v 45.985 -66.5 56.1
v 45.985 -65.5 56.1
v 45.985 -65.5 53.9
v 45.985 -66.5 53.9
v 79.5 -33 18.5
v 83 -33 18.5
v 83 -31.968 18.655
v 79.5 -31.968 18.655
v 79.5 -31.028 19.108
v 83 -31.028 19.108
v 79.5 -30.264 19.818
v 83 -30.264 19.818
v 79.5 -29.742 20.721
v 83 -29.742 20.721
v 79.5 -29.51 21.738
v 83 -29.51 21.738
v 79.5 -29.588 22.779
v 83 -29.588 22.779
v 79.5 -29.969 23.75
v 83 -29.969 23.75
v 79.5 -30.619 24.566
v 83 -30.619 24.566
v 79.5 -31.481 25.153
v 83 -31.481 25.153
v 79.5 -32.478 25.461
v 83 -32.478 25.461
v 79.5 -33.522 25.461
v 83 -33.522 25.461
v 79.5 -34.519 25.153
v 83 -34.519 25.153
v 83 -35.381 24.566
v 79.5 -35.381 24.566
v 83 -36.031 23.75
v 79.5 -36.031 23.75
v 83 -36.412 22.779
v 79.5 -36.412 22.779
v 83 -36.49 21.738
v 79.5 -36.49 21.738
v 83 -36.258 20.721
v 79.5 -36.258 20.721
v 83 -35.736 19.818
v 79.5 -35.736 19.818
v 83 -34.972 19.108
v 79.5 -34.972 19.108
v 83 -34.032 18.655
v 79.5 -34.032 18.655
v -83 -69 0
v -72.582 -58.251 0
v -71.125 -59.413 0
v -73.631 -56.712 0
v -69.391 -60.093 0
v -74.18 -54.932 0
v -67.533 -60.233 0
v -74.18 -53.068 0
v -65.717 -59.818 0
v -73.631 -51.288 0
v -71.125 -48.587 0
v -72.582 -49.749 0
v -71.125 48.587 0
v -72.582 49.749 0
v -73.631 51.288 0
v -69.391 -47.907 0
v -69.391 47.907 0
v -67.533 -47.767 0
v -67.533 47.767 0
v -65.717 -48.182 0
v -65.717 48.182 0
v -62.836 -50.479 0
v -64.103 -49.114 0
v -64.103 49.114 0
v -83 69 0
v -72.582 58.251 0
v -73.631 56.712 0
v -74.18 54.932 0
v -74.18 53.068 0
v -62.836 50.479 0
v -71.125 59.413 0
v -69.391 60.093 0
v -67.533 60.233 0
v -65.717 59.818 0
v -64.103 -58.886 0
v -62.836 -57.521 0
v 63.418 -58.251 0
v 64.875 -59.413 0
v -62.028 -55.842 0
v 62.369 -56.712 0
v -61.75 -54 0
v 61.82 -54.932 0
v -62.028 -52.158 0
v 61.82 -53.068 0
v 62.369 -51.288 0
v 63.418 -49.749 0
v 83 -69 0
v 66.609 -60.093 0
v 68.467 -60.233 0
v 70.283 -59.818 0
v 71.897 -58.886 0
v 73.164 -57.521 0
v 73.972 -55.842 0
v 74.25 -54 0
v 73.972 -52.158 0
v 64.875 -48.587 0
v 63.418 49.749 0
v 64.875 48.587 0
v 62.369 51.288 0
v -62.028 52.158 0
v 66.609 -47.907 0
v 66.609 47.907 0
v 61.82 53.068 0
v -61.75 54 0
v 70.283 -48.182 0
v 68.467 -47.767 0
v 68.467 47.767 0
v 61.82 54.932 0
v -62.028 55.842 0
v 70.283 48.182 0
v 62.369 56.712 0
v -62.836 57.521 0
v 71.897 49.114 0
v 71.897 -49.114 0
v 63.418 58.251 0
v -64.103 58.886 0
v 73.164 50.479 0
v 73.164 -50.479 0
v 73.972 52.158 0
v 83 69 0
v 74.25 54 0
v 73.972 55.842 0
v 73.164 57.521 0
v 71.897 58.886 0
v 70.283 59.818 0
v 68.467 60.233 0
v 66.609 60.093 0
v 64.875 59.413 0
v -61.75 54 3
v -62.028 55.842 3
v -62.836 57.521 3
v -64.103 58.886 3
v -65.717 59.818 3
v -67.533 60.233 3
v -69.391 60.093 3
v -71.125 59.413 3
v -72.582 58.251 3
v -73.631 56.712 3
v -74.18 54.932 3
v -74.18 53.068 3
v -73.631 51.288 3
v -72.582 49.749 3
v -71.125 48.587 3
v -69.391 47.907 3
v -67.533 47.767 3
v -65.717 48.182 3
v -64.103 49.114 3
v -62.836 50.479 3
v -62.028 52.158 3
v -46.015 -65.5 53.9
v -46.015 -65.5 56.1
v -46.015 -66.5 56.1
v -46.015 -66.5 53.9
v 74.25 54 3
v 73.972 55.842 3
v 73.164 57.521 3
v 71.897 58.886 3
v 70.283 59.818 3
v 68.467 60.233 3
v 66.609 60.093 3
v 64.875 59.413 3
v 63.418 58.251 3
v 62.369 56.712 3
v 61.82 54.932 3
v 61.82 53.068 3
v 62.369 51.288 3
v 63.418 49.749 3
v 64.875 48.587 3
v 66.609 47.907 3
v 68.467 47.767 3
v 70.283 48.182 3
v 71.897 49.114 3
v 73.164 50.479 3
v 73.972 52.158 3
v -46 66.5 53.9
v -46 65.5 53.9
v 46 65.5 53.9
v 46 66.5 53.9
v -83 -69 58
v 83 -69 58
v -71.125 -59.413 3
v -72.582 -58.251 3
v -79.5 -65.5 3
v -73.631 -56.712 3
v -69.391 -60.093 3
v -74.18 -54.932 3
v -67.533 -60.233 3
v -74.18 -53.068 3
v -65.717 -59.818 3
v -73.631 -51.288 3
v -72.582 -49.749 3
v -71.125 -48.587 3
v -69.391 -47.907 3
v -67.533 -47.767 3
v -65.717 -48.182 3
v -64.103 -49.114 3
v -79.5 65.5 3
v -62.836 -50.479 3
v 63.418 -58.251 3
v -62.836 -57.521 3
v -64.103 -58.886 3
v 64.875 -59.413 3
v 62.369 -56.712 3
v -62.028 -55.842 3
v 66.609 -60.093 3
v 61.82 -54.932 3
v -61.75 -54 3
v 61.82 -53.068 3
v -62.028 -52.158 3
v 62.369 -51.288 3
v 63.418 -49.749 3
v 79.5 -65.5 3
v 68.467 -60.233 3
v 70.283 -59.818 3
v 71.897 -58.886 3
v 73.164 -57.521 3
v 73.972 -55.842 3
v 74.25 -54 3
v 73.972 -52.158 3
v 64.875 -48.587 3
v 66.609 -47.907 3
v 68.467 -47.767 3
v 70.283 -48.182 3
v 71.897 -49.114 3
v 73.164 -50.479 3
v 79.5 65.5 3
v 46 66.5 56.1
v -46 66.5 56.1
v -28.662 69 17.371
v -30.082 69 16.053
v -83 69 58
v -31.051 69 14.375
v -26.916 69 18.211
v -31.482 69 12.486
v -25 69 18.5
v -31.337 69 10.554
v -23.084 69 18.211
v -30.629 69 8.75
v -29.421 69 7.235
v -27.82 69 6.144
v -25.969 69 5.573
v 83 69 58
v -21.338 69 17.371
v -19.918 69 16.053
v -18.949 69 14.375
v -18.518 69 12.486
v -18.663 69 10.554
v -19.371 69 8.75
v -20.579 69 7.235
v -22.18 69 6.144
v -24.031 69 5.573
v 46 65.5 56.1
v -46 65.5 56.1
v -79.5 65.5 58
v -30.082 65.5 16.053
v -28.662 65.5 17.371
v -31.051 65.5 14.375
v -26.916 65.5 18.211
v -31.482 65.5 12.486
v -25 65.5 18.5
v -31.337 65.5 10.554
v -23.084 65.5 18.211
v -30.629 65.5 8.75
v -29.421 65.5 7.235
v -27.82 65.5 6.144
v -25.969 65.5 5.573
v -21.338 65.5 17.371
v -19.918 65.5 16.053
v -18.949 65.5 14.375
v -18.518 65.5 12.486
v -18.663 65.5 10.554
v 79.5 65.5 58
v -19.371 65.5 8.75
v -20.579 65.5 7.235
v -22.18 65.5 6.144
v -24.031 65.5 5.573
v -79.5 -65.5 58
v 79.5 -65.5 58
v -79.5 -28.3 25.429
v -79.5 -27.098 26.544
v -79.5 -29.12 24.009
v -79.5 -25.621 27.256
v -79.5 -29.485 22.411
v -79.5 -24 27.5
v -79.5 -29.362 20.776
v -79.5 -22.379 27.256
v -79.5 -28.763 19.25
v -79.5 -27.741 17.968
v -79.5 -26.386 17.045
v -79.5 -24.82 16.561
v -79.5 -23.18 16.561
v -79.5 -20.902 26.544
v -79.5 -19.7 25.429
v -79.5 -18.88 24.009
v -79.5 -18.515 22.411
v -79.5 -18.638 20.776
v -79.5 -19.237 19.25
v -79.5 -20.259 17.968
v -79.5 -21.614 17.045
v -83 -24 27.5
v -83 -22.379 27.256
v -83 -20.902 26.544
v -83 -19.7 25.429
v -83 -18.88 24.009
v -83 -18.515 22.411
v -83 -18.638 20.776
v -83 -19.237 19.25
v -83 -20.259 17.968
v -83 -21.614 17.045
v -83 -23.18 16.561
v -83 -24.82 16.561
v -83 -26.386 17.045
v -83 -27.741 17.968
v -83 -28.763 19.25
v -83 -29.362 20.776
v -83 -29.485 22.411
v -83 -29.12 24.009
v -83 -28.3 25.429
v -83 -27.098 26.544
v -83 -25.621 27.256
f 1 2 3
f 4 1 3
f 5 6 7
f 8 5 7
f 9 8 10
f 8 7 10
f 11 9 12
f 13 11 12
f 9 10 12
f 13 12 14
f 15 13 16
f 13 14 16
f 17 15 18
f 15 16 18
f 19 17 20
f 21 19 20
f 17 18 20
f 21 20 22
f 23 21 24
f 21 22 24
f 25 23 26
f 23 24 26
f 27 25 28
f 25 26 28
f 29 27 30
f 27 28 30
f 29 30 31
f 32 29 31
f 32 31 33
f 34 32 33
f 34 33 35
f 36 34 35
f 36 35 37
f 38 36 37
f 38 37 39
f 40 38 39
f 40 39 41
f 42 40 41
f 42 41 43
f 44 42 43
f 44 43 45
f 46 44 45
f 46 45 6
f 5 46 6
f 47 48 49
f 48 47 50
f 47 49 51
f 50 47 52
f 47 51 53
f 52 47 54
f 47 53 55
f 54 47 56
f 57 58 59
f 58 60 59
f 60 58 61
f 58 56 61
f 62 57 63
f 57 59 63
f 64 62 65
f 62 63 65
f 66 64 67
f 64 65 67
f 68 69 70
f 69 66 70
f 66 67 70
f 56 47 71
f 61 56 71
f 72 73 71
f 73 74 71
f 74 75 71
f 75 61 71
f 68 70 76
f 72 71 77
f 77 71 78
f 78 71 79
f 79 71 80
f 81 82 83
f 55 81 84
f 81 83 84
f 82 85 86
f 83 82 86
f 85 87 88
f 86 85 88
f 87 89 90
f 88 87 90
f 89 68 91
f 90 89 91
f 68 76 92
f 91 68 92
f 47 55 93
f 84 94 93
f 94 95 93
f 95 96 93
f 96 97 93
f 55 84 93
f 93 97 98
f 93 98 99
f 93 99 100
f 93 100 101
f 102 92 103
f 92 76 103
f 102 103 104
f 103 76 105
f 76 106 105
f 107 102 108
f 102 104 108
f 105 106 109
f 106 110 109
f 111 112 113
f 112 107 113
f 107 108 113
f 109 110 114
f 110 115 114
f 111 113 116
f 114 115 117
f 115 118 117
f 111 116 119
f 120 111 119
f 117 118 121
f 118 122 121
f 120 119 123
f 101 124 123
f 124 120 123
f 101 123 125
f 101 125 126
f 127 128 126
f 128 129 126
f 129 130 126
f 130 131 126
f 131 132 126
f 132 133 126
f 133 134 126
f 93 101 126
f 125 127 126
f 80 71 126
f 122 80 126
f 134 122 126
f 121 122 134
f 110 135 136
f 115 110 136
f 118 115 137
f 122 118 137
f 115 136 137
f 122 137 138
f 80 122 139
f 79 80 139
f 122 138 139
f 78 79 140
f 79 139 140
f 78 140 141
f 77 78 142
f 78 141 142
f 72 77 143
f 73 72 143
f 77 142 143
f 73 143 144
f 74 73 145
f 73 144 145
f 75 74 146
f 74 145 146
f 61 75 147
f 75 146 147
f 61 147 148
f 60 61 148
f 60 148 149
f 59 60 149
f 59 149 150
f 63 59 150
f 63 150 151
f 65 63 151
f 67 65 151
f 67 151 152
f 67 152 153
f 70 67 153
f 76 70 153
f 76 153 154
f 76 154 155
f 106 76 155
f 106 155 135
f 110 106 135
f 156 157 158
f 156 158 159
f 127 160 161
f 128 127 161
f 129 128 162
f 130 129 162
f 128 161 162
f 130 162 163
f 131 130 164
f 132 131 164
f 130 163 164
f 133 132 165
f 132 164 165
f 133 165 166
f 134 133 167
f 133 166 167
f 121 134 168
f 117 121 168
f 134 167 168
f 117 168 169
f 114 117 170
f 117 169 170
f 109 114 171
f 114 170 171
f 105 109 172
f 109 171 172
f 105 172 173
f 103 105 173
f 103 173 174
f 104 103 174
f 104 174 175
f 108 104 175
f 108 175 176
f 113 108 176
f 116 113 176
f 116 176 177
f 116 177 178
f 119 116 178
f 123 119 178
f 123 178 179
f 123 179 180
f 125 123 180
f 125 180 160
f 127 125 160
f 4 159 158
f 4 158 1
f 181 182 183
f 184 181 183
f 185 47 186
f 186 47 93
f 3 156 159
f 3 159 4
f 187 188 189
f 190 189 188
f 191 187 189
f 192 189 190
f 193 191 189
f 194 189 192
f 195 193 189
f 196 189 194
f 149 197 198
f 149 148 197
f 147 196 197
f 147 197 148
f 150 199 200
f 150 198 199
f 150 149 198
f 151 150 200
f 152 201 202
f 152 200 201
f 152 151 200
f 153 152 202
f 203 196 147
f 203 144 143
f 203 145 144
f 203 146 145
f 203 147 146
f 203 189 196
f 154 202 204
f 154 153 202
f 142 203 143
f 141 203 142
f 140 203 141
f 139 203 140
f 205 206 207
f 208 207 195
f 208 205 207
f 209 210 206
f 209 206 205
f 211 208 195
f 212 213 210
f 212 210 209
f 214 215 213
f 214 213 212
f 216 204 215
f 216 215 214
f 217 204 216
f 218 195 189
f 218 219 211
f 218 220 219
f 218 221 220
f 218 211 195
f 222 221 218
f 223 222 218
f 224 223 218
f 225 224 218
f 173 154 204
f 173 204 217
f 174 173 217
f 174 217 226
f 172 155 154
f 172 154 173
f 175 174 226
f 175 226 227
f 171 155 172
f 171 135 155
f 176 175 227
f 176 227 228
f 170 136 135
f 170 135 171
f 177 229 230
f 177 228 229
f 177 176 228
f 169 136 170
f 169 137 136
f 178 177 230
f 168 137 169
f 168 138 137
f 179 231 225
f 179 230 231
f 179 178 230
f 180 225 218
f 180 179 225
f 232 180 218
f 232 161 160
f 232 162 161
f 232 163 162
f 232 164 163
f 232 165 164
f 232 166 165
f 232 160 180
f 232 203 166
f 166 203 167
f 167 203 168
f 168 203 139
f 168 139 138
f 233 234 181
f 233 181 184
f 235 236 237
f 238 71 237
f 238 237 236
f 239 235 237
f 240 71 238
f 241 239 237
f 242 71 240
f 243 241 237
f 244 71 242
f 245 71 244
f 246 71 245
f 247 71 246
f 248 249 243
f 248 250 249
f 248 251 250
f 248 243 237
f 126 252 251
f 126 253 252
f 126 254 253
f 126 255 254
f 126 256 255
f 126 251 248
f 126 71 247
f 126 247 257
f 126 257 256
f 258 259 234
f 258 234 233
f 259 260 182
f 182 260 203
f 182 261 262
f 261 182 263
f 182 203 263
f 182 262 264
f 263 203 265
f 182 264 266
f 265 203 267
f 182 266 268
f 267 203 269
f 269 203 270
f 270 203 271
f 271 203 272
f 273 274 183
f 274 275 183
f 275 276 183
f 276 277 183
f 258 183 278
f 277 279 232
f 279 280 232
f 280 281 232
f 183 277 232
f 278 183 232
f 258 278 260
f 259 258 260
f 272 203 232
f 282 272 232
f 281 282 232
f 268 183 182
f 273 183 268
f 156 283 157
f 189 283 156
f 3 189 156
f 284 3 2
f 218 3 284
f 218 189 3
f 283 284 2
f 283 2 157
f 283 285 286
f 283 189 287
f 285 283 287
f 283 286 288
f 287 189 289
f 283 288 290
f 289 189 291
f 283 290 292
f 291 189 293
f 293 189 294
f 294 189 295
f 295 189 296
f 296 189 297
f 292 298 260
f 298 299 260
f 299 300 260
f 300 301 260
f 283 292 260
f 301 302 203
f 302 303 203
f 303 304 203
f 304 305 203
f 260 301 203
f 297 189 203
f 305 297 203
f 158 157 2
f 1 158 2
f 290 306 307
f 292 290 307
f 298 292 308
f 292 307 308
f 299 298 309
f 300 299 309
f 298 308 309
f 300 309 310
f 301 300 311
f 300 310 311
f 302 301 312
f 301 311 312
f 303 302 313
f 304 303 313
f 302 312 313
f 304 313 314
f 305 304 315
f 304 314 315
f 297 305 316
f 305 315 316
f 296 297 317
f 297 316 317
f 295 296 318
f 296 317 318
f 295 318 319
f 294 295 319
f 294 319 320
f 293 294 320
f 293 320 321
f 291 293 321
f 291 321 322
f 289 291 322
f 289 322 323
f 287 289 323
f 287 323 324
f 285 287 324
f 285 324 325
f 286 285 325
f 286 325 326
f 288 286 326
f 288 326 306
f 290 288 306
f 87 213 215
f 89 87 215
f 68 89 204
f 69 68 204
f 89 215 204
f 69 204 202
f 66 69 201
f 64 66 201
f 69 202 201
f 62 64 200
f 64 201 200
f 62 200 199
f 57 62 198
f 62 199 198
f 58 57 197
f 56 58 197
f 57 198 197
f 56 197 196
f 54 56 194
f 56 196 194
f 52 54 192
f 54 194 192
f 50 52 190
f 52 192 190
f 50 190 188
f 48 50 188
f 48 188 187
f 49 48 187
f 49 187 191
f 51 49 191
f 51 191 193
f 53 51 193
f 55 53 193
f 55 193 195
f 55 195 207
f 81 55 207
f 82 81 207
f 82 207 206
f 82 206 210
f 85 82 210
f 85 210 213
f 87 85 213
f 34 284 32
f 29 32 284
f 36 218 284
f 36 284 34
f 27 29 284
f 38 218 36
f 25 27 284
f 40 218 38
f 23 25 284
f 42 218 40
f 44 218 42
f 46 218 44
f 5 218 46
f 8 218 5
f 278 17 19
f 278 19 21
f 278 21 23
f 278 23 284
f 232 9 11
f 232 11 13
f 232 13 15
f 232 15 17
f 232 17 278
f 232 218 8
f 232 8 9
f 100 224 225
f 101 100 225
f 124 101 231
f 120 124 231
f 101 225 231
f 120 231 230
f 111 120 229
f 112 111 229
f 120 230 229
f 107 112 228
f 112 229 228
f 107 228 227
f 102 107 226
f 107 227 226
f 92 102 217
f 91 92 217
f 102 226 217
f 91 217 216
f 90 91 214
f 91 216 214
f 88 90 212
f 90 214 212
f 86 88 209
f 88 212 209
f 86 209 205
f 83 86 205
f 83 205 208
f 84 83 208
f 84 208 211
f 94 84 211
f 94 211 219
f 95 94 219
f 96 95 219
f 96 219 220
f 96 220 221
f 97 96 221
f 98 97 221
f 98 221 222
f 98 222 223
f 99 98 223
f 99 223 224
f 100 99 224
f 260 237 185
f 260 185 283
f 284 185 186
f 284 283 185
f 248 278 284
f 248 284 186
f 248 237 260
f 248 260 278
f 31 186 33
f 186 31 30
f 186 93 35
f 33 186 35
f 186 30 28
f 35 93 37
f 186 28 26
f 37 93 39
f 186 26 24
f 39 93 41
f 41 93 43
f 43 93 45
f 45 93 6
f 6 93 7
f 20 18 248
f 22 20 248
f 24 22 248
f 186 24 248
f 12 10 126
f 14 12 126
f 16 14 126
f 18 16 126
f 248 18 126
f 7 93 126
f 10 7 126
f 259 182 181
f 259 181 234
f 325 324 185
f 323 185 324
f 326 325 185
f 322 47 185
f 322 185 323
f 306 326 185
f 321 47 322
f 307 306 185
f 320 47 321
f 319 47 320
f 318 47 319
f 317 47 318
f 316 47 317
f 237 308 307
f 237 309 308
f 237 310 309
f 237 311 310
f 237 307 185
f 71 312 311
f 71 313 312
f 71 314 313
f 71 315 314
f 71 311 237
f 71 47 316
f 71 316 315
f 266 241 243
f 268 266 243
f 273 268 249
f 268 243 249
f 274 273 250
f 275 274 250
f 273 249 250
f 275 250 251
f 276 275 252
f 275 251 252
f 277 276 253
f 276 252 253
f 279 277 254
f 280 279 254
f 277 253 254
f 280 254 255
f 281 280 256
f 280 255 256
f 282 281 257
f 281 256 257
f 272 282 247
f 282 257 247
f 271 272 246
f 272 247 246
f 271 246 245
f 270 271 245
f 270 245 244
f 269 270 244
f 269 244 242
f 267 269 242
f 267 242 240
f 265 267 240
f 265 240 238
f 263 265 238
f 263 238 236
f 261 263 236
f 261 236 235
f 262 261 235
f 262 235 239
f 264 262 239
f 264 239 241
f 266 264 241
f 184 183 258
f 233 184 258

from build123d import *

# Parameters (mm, degrees)
SKETCH_1_W          = 166
SKETCH_1_H          = 138
EXTRUDE_1_DEPTH     = 3
SKETCH_2_W          = 166
SKETCH_2_H          = 138
SKETCH_2_W_2        = 159
SKETCH_2_H_2        = 131
EXTRUDE_2_DEPTH     = 55
CUT_EXTRUDE_4_REACH = 123.14
SKETCH_3_R          = 6.25
SKETCH_4_W          = 92
SKETCH_4_H          = 2.2
CUT_EXTRUDE_5_DEPTH = 1
SKETCH_5_W          = 92
SKETCH_5_H          = 2.2
CUT_EXTRUDE_6_DEPTH = 1
SKETCH_6_R          = 6.5
CUT_EXTRUDE_7_DEPTH = 10
SKETCH_7_R          = 5.5
CUT_EXTRUDE_8_DEPTH = 10
SKETCH_8_R          = 3.5
CUT_EXTRUDE_9_DEPTH = 10


with BuildPart() as part:
    # 스케치1 → 보스-돌출1 (new body)
    with BuildSketch(Plane.XY):
        Rectangle(SKETCH_1_W, SKETCH_1_H)
    extrude(amount=EXTRUDE_1_DEPTH)

    # 스케치2 → 보스-돌출2 (add)
    with BuildSketch(Plane.XY.offset(3)):
        Rectangle(SKETCH_2_W, SKETCH_2_H)
        Rectangle(SKETCH_2_W_2, SKETCH_2_H_2, mode=Mode.SUBTRACT)
    extrude(amount=EXTRUDE_2_DEPTH)

    # 스케치3 → 컷-돌출4 (cut, up to next)
    with BuildSketch(Plane.XY.offset(3), mode=Mode.PRIVATE) as cut_extrude_4_sk1:
        with Locations((-68, 54)):
            Circle(SKETCH_3_R)
    cut_extrude_4_tool1 = extrude(cut_extrude_4_sk1.sketch, amount=-CUT_EXTRUDE_4_REACH, mode=Mode.PRIVATE) & part.part
    # 스케치3 → 컷-돌출4 (cut, up to next)
    with BuildSketch(Plane.XY.offset(3), mode=Mode.PRIVATE) as cut_extrude_4_sk2:
        with Locations((-68, -54)):
            Circle(SKETCH_3_R)
    cut_extrude_4_tool2 = extrude(cut_extrude_4_sk2.sketch, amount=-CUT_EXTRUDE_4_REACH, mode=Mode.PRIVATE) & part.part
    # 스케치3 → 컷-돌출4 (cut, up to next)
    with BuildSketch(Plane.XY.offset(3), mode=Mode.PRIVATE) as cut_extrude_4_sk3:
        with Locations((68, -54)):
            Circle(SKETCH_3_R)
    cut_extrude_4_tool3 = extrude(cut_extrude_4_sk3.sketch, amount=-CUT_EXTRUDE_4_REACH, mode=Mode.PRIVATE) & part.part
    # 스케치3 → 컷-돌출4 (cut, up to next)
    with BuildSketch(Plane.XY.offset(3), mode=Mode.PRIVATE) as cut_extrude_4_sk4:
        with Locations((68, 54)):
            Circle(SKETCH_3_R)
    cut_extrude_4_tool4 = extrude(cut_extrude_4_sk4.sketch, amount=-CUT_EXTRUDE_4_REACH, mode=Mode.PRIVATE) & part.part
    add(cut_extrude_4_tool1.solids().sort_by_distance((-68, 54, 3))[0], mode=Mode.SUBTRACT)
    add(cut_extrude_4_tool2.solids().sort_by_distance((-68, -54, 3))[0], mode=Mode.SUBTRACT)
    add(cut_extrude_4_tool3.solids().sort_by_distance((68, -54, 3))[0], mode=Mode.SUBTRACT)
    add(cut_extrude_4_tool4.solids().sort_by_distance((68, 54, 3))[0], mode=Mode.SUBTRACT)

    # 스케치4 → 컷-돌출5 (cut)
    with BuildSketch(Plane.XZ.offset(-65.5)):
        with Locations((0, 55)):
            Rectangle(SKETCH_4_W, SKETCH_4_H)
    extrude(amount=-CUT_EXTRUDE_5_DEPTH, mode=Mode.SUBTRACT)

    # 스케치5 → 컷-돌출6 (cut)
    with BuildSketch(Plane(origin=(0, -65.5, 0), x_dir=(1, 0, 0), z_dir=(0, 1, 0))):
        with Locations((-0.014955436, -55)):
            Rectangle(SKETCH_5_W, SKETCH_5_H)
    extrude(amount=-CUT_EXTRUDE_6_DEPTH, mode=Mode.SUBTRACT)

    # 스케치6 → 컷-돌출7 (cut)
    with BuildSketch(Plane(origin=(0, 69, 0), x_dir=(1, 0, 0), z_dir=(0, 1, 0))):
        with Locations(Location((-25, -12, 0), (0, 0, 270))):
            Circle(SKETCH_6_R)
    extrude(amount=-CUT_EXTRUDE_7_DEPTH, mode=Mode.SUBTRACT)

    # 스케치7 → 컷-돌출8 (cut)
    with BuildSketch(Plane.ZY.offset(83)):
        with Locations((22, -24)):
            Circle(SKETCH_7_R)
    extrude(amount=-CUT_EXTRUDE_8_DEPTH, mode=Mode.SUBTRACT)

    # 스케치8 → 컷-돌출9 (cut)
    with BuildSketch(Plane(origin=(83, 0, 0), x_dir=(0, 0, -1), z_dir=(1, 0, 0))):
        with Locations((-22, -33)):
            Circle(SKETCH_8_R)
    extrude(amount=-CUT_EXTRUDE_9_DEPTH, mode=Mode.SUBTRACT)


solid = part.part
